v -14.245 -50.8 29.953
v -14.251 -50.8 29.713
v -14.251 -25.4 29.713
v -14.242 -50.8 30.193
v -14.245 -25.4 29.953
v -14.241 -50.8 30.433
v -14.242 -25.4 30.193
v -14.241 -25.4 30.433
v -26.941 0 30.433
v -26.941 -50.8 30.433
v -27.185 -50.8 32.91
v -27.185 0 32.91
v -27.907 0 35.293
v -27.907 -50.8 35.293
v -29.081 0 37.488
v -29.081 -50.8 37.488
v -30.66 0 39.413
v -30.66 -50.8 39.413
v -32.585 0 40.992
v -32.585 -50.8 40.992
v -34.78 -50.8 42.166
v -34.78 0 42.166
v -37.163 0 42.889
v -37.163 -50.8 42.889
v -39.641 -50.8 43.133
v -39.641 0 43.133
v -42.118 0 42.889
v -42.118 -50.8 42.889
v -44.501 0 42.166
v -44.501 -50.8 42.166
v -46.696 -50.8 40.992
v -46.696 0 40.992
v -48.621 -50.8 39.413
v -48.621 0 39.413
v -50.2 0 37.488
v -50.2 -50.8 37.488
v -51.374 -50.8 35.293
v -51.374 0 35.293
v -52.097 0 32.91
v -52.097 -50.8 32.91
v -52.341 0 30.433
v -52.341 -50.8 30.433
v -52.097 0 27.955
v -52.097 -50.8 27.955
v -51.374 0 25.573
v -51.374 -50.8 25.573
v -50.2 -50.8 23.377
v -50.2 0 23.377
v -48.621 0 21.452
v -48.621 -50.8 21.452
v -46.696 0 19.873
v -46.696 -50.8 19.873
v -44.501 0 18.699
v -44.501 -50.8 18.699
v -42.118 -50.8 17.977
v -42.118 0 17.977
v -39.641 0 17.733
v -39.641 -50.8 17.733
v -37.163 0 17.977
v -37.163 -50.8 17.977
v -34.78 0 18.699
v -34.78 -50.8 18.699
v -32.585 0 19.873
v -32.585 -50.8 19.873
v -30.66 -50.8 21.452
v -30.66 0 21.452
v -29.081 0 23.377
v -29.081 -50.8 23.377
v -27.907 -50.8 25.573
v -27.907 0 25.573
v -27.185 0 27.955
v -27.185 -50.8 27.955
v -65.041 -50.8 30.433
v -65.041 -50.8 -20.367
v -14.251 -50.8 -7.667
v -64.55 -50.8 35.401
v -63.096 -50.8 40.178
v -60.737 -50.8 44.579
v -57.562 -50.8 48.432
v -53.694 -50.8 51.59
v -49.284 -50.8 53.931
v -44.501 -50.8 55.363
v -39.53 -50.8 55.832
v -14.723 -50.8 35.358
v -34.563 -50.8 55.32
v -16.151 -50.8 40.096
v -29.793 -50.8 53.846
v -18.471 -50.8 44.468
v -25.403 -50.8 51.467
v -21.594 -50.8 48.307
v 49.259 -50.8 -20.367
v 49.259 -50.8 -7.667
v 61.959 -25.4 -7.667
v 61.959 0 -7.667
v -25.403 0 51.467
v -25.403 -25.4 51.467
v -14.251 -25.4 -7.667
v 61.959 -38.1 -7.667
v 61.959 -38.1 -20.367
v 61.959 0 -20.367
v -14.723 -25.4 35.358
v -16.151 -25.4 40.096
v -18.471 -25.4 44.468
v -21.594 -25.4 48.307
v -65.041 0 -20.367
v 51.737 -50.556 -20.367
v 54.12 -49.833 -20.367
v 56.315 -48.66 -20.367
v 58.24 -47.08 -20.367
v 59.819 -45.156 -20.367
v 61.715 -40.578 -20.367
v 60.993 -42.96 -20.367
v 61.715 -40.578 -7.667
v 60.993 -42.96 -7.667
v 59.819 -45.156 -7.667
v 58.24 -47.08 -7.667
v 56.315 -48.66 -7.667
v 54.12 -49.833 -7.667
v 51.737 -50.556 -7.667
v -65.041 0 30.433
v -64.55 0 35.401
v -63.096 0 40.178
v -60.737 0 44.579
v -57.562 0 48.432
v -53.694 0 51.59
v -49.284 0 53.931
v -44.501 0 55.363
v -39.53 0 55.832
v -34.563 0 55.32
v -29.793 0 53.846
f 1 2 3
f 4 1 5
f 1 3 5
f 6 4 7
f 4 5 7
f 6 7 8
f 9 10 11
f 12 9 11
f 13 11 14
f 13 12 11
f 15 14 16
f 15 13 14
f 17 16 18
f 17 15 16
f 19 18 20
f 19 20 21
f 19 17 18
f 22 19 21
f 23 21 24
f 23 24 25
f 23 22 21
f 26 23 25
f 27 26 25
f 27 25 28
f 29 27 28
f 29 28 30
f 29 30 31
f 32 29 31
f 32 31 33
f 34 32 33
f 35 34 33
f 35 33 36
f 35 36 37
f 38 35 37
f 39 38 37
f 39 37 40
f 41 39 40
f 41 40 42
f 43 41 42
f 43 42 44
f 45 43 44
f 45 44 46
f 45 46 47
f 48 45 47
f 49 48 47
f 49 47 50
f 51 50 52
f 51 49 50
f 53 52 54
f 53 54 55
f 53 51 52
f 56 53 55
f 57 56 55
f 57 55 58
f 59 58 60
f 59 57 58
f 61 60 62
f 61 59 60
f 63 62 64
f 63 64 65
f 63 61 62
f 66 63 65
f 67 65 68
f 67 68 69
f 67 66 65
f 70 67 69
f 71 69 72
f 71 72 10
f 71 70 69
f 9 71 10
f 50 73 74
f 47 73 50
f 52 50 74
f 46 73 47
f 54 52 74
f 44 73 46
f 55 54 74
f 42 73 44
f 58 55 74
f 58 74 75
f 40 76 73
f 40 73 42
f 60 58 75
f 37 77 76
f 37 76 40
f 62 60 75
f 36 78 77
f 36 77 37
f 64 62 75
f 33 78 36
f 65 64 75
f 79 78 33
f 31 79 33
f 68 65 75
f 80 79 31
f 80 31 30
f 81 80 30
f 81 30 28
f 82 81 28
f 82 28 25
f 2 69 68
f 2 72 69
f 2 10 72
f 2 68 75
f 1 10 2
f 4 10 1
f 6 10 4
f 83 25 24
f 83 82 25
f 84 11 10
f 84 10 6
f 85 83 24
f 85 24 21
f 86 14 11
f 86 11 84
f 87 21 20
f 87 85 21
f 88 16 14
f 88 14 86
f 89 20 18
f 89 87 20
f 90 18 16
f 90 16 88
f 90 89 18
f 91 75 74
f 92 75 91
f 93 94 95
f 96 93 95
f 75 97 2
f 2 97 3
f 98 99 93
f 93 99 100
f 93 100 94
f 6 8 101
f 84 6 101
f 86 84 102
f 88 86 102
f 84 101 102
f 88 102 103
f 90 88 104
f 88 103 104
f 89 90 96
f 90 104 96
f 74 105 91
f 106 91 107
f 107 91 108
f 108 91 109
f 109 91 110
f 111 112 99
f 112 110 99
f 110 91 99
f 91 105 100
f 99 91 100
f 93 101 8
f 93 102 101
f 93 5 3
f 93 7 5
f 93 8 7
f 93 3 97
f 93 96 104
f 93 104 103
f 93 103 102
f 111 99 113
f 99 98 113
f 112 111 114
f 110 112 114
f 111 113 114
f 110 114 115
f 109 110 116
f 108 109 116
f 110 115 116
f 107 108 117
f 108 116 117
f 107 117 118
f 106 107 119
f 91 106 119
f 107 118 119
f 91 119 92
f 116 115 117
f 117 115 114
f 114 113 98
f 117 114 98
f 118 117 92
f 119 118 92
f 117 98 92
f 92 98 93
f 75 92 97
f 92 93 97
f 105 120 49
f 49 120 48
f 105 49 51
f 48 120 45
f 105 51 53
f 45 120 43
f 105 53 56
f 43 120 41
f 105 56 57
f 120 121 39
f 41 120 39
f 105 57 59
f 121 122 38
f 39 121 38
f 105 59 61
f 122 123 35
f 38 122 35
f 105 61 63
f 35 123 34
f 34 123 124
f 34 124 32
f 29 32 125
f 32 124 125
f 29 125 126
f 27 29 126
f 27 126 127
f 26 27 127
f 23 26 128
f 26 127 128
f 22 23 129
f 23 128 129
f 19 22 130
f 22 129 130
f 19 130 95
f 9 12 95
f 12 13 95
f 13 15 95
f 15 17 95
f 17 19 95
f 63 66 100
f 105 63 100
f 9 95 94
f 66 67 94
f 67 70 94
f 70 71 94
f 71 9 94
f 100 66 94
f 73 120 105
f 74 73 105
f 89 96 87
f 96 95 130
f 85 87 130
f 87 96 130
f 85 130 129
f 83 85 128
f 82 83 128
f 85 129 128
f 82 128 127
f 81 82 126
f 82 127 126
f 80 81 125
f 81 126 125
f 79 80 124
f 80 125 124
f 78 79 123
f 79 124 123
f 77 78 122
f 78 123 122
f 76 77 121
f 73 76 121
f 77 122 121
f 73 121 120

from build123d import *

# Parameters (mm, degrees)
F0_R     = 12.7
F1_DEPTH = 25.4
F2_R     = 12.7
F3_DEPTH = 25.4
F4_DEPTH = 25.4
F5_DEPTH = 25.4
F6_R     = 12.7


with BuildPart() as f1:
    # F0 (on Front) → F1 (new body)
    with BuildSketch(Plane.XZ):
        with BuildLine():
            Line((61.959432, -7.667416), (-25.402695, 51.466912))
            ThreePointArc((-25.402695, 51.466912), (-51.546828, 52.869183), (-65.040568, 30.432584))
            Line((-65.040568, 30.432584), (-65.040568, -20.367416))
            Line((-65.040568, -20.367416), (61.959432, -20.367416))
            Line((61.959432, -20.367416), (61.959432, -7.667416))
        make_face()
        with Locations((-39.640568, 30.432584)):
            Circle(F0_R, mode=Mode.SUBTRACT)
    extrude(amount=F1_DEPTH)

    # F2 (on face) → F3 (join)
    with BuildSketch(Plane.XZ.offset(25.4)):
        with BuildLine():
            ThreePointArc((-14.240568, 30.432584), (-17.203969, 42.338843), (-25.402695, 51.466912))
            ThreePointArc((-25.402695, 51.466912), (-51.546828, 52.869183), (-65.040568, 30.432584))
            ThreePointArc((-65.040568, 30.432584), (-40.000603, 5.035136), (-14.250775, 29.712586))
            ThreePointArc((-14.250775, 29.712586), (-14.24312, 30.072549), (-14.240568, 30.432584))
        make_face()
        with Locations((-39.640568, 30.432584)):
            Circle(F2_R, mode=Mode.SUBTRACT)
    extrude(amount=F3_DEPTH)

    # F2 (on face) → F4 (join)
    with BuildSketch(Plane.XZ.offset(25.4)):
        with BuildLine():
            ThreePointArc((-14.240568, 30.432584), (-17.203969, 42.338843), (-25.402695, 51.466912))
            ThreePointArc((-25.402695, 51.466912), (-51.546828, 52.869183), (-65.040568, 30.432584))
            ThreePointArc((-65.040568, 30.432584), (-40.000603, 5.035136), (-14.250775, 29.712586))
            ThreePointArc((-14.250775, 29.712586), (-14.24312, 30.072549), (-14.240568, 30.432584))
        make_face()
        with Locations((-39.640568, 30.432584)):
            Circle(F2_R, mode=Mode.SUBTRACT)
    extrude(amount=F4_DEPTH)

    # F2 (on face) → F5 (join)
    with BuildSketch(Plane.XZ.offset(25.4)):
        with BuildLine():
            Line((61.959432, -20.367416), (61.959432, -7.667416))
            Line((61.959432, -7.667416), (-14.250775, -7.667416))
            Line((-14.250775, -7.667416), (-14.250775, 29.712586))
            ThreePointArc((-14.250775, 29.712586), (-40.000603, 5.035136), (-65.040568, 30.432584))
            Line((-65.040568, 30.432584), (-65.040568, -7.667416))
            Line((-65.040568, -7.667416), (-65.040568, -20.367416))
            Line((-65.040568, -20.367416), (61.959432, -20.367416))
        make_face()
        with BuildLine():
            ThreePointArc((-14.240568, 30.432584), (-17.203969, 42.338843), (-25.402695, 51.466912))
            ThreePointArc((-25.402695, 51.466912), (-51.546828, 52.869183), (-65.040568, 30.432584))
            ThreePointArc((-65.040568, 30.432584), (-40.000603, 5.035136), (-14.250775, 29.712586))
            ThreePointArc((-14.250775, 29.712586), (-14.24312, 30.072549), (-14.240568, 30.432584))
        make_face()
        with Locations((-39.640568, 30.432584)):
            Circle(F2_R, mode=Mode.SUBTRACT)
    extrude(amount=F5_DEPTH)

    # F6
    f6_edges = [f1.edges().sort_by_distance(p)[0] for p in [
        (61.959432, -50.8, -14.017416),
    ]]
    fillet(f6_edges, radius=F6_R)


solid = f1.part
